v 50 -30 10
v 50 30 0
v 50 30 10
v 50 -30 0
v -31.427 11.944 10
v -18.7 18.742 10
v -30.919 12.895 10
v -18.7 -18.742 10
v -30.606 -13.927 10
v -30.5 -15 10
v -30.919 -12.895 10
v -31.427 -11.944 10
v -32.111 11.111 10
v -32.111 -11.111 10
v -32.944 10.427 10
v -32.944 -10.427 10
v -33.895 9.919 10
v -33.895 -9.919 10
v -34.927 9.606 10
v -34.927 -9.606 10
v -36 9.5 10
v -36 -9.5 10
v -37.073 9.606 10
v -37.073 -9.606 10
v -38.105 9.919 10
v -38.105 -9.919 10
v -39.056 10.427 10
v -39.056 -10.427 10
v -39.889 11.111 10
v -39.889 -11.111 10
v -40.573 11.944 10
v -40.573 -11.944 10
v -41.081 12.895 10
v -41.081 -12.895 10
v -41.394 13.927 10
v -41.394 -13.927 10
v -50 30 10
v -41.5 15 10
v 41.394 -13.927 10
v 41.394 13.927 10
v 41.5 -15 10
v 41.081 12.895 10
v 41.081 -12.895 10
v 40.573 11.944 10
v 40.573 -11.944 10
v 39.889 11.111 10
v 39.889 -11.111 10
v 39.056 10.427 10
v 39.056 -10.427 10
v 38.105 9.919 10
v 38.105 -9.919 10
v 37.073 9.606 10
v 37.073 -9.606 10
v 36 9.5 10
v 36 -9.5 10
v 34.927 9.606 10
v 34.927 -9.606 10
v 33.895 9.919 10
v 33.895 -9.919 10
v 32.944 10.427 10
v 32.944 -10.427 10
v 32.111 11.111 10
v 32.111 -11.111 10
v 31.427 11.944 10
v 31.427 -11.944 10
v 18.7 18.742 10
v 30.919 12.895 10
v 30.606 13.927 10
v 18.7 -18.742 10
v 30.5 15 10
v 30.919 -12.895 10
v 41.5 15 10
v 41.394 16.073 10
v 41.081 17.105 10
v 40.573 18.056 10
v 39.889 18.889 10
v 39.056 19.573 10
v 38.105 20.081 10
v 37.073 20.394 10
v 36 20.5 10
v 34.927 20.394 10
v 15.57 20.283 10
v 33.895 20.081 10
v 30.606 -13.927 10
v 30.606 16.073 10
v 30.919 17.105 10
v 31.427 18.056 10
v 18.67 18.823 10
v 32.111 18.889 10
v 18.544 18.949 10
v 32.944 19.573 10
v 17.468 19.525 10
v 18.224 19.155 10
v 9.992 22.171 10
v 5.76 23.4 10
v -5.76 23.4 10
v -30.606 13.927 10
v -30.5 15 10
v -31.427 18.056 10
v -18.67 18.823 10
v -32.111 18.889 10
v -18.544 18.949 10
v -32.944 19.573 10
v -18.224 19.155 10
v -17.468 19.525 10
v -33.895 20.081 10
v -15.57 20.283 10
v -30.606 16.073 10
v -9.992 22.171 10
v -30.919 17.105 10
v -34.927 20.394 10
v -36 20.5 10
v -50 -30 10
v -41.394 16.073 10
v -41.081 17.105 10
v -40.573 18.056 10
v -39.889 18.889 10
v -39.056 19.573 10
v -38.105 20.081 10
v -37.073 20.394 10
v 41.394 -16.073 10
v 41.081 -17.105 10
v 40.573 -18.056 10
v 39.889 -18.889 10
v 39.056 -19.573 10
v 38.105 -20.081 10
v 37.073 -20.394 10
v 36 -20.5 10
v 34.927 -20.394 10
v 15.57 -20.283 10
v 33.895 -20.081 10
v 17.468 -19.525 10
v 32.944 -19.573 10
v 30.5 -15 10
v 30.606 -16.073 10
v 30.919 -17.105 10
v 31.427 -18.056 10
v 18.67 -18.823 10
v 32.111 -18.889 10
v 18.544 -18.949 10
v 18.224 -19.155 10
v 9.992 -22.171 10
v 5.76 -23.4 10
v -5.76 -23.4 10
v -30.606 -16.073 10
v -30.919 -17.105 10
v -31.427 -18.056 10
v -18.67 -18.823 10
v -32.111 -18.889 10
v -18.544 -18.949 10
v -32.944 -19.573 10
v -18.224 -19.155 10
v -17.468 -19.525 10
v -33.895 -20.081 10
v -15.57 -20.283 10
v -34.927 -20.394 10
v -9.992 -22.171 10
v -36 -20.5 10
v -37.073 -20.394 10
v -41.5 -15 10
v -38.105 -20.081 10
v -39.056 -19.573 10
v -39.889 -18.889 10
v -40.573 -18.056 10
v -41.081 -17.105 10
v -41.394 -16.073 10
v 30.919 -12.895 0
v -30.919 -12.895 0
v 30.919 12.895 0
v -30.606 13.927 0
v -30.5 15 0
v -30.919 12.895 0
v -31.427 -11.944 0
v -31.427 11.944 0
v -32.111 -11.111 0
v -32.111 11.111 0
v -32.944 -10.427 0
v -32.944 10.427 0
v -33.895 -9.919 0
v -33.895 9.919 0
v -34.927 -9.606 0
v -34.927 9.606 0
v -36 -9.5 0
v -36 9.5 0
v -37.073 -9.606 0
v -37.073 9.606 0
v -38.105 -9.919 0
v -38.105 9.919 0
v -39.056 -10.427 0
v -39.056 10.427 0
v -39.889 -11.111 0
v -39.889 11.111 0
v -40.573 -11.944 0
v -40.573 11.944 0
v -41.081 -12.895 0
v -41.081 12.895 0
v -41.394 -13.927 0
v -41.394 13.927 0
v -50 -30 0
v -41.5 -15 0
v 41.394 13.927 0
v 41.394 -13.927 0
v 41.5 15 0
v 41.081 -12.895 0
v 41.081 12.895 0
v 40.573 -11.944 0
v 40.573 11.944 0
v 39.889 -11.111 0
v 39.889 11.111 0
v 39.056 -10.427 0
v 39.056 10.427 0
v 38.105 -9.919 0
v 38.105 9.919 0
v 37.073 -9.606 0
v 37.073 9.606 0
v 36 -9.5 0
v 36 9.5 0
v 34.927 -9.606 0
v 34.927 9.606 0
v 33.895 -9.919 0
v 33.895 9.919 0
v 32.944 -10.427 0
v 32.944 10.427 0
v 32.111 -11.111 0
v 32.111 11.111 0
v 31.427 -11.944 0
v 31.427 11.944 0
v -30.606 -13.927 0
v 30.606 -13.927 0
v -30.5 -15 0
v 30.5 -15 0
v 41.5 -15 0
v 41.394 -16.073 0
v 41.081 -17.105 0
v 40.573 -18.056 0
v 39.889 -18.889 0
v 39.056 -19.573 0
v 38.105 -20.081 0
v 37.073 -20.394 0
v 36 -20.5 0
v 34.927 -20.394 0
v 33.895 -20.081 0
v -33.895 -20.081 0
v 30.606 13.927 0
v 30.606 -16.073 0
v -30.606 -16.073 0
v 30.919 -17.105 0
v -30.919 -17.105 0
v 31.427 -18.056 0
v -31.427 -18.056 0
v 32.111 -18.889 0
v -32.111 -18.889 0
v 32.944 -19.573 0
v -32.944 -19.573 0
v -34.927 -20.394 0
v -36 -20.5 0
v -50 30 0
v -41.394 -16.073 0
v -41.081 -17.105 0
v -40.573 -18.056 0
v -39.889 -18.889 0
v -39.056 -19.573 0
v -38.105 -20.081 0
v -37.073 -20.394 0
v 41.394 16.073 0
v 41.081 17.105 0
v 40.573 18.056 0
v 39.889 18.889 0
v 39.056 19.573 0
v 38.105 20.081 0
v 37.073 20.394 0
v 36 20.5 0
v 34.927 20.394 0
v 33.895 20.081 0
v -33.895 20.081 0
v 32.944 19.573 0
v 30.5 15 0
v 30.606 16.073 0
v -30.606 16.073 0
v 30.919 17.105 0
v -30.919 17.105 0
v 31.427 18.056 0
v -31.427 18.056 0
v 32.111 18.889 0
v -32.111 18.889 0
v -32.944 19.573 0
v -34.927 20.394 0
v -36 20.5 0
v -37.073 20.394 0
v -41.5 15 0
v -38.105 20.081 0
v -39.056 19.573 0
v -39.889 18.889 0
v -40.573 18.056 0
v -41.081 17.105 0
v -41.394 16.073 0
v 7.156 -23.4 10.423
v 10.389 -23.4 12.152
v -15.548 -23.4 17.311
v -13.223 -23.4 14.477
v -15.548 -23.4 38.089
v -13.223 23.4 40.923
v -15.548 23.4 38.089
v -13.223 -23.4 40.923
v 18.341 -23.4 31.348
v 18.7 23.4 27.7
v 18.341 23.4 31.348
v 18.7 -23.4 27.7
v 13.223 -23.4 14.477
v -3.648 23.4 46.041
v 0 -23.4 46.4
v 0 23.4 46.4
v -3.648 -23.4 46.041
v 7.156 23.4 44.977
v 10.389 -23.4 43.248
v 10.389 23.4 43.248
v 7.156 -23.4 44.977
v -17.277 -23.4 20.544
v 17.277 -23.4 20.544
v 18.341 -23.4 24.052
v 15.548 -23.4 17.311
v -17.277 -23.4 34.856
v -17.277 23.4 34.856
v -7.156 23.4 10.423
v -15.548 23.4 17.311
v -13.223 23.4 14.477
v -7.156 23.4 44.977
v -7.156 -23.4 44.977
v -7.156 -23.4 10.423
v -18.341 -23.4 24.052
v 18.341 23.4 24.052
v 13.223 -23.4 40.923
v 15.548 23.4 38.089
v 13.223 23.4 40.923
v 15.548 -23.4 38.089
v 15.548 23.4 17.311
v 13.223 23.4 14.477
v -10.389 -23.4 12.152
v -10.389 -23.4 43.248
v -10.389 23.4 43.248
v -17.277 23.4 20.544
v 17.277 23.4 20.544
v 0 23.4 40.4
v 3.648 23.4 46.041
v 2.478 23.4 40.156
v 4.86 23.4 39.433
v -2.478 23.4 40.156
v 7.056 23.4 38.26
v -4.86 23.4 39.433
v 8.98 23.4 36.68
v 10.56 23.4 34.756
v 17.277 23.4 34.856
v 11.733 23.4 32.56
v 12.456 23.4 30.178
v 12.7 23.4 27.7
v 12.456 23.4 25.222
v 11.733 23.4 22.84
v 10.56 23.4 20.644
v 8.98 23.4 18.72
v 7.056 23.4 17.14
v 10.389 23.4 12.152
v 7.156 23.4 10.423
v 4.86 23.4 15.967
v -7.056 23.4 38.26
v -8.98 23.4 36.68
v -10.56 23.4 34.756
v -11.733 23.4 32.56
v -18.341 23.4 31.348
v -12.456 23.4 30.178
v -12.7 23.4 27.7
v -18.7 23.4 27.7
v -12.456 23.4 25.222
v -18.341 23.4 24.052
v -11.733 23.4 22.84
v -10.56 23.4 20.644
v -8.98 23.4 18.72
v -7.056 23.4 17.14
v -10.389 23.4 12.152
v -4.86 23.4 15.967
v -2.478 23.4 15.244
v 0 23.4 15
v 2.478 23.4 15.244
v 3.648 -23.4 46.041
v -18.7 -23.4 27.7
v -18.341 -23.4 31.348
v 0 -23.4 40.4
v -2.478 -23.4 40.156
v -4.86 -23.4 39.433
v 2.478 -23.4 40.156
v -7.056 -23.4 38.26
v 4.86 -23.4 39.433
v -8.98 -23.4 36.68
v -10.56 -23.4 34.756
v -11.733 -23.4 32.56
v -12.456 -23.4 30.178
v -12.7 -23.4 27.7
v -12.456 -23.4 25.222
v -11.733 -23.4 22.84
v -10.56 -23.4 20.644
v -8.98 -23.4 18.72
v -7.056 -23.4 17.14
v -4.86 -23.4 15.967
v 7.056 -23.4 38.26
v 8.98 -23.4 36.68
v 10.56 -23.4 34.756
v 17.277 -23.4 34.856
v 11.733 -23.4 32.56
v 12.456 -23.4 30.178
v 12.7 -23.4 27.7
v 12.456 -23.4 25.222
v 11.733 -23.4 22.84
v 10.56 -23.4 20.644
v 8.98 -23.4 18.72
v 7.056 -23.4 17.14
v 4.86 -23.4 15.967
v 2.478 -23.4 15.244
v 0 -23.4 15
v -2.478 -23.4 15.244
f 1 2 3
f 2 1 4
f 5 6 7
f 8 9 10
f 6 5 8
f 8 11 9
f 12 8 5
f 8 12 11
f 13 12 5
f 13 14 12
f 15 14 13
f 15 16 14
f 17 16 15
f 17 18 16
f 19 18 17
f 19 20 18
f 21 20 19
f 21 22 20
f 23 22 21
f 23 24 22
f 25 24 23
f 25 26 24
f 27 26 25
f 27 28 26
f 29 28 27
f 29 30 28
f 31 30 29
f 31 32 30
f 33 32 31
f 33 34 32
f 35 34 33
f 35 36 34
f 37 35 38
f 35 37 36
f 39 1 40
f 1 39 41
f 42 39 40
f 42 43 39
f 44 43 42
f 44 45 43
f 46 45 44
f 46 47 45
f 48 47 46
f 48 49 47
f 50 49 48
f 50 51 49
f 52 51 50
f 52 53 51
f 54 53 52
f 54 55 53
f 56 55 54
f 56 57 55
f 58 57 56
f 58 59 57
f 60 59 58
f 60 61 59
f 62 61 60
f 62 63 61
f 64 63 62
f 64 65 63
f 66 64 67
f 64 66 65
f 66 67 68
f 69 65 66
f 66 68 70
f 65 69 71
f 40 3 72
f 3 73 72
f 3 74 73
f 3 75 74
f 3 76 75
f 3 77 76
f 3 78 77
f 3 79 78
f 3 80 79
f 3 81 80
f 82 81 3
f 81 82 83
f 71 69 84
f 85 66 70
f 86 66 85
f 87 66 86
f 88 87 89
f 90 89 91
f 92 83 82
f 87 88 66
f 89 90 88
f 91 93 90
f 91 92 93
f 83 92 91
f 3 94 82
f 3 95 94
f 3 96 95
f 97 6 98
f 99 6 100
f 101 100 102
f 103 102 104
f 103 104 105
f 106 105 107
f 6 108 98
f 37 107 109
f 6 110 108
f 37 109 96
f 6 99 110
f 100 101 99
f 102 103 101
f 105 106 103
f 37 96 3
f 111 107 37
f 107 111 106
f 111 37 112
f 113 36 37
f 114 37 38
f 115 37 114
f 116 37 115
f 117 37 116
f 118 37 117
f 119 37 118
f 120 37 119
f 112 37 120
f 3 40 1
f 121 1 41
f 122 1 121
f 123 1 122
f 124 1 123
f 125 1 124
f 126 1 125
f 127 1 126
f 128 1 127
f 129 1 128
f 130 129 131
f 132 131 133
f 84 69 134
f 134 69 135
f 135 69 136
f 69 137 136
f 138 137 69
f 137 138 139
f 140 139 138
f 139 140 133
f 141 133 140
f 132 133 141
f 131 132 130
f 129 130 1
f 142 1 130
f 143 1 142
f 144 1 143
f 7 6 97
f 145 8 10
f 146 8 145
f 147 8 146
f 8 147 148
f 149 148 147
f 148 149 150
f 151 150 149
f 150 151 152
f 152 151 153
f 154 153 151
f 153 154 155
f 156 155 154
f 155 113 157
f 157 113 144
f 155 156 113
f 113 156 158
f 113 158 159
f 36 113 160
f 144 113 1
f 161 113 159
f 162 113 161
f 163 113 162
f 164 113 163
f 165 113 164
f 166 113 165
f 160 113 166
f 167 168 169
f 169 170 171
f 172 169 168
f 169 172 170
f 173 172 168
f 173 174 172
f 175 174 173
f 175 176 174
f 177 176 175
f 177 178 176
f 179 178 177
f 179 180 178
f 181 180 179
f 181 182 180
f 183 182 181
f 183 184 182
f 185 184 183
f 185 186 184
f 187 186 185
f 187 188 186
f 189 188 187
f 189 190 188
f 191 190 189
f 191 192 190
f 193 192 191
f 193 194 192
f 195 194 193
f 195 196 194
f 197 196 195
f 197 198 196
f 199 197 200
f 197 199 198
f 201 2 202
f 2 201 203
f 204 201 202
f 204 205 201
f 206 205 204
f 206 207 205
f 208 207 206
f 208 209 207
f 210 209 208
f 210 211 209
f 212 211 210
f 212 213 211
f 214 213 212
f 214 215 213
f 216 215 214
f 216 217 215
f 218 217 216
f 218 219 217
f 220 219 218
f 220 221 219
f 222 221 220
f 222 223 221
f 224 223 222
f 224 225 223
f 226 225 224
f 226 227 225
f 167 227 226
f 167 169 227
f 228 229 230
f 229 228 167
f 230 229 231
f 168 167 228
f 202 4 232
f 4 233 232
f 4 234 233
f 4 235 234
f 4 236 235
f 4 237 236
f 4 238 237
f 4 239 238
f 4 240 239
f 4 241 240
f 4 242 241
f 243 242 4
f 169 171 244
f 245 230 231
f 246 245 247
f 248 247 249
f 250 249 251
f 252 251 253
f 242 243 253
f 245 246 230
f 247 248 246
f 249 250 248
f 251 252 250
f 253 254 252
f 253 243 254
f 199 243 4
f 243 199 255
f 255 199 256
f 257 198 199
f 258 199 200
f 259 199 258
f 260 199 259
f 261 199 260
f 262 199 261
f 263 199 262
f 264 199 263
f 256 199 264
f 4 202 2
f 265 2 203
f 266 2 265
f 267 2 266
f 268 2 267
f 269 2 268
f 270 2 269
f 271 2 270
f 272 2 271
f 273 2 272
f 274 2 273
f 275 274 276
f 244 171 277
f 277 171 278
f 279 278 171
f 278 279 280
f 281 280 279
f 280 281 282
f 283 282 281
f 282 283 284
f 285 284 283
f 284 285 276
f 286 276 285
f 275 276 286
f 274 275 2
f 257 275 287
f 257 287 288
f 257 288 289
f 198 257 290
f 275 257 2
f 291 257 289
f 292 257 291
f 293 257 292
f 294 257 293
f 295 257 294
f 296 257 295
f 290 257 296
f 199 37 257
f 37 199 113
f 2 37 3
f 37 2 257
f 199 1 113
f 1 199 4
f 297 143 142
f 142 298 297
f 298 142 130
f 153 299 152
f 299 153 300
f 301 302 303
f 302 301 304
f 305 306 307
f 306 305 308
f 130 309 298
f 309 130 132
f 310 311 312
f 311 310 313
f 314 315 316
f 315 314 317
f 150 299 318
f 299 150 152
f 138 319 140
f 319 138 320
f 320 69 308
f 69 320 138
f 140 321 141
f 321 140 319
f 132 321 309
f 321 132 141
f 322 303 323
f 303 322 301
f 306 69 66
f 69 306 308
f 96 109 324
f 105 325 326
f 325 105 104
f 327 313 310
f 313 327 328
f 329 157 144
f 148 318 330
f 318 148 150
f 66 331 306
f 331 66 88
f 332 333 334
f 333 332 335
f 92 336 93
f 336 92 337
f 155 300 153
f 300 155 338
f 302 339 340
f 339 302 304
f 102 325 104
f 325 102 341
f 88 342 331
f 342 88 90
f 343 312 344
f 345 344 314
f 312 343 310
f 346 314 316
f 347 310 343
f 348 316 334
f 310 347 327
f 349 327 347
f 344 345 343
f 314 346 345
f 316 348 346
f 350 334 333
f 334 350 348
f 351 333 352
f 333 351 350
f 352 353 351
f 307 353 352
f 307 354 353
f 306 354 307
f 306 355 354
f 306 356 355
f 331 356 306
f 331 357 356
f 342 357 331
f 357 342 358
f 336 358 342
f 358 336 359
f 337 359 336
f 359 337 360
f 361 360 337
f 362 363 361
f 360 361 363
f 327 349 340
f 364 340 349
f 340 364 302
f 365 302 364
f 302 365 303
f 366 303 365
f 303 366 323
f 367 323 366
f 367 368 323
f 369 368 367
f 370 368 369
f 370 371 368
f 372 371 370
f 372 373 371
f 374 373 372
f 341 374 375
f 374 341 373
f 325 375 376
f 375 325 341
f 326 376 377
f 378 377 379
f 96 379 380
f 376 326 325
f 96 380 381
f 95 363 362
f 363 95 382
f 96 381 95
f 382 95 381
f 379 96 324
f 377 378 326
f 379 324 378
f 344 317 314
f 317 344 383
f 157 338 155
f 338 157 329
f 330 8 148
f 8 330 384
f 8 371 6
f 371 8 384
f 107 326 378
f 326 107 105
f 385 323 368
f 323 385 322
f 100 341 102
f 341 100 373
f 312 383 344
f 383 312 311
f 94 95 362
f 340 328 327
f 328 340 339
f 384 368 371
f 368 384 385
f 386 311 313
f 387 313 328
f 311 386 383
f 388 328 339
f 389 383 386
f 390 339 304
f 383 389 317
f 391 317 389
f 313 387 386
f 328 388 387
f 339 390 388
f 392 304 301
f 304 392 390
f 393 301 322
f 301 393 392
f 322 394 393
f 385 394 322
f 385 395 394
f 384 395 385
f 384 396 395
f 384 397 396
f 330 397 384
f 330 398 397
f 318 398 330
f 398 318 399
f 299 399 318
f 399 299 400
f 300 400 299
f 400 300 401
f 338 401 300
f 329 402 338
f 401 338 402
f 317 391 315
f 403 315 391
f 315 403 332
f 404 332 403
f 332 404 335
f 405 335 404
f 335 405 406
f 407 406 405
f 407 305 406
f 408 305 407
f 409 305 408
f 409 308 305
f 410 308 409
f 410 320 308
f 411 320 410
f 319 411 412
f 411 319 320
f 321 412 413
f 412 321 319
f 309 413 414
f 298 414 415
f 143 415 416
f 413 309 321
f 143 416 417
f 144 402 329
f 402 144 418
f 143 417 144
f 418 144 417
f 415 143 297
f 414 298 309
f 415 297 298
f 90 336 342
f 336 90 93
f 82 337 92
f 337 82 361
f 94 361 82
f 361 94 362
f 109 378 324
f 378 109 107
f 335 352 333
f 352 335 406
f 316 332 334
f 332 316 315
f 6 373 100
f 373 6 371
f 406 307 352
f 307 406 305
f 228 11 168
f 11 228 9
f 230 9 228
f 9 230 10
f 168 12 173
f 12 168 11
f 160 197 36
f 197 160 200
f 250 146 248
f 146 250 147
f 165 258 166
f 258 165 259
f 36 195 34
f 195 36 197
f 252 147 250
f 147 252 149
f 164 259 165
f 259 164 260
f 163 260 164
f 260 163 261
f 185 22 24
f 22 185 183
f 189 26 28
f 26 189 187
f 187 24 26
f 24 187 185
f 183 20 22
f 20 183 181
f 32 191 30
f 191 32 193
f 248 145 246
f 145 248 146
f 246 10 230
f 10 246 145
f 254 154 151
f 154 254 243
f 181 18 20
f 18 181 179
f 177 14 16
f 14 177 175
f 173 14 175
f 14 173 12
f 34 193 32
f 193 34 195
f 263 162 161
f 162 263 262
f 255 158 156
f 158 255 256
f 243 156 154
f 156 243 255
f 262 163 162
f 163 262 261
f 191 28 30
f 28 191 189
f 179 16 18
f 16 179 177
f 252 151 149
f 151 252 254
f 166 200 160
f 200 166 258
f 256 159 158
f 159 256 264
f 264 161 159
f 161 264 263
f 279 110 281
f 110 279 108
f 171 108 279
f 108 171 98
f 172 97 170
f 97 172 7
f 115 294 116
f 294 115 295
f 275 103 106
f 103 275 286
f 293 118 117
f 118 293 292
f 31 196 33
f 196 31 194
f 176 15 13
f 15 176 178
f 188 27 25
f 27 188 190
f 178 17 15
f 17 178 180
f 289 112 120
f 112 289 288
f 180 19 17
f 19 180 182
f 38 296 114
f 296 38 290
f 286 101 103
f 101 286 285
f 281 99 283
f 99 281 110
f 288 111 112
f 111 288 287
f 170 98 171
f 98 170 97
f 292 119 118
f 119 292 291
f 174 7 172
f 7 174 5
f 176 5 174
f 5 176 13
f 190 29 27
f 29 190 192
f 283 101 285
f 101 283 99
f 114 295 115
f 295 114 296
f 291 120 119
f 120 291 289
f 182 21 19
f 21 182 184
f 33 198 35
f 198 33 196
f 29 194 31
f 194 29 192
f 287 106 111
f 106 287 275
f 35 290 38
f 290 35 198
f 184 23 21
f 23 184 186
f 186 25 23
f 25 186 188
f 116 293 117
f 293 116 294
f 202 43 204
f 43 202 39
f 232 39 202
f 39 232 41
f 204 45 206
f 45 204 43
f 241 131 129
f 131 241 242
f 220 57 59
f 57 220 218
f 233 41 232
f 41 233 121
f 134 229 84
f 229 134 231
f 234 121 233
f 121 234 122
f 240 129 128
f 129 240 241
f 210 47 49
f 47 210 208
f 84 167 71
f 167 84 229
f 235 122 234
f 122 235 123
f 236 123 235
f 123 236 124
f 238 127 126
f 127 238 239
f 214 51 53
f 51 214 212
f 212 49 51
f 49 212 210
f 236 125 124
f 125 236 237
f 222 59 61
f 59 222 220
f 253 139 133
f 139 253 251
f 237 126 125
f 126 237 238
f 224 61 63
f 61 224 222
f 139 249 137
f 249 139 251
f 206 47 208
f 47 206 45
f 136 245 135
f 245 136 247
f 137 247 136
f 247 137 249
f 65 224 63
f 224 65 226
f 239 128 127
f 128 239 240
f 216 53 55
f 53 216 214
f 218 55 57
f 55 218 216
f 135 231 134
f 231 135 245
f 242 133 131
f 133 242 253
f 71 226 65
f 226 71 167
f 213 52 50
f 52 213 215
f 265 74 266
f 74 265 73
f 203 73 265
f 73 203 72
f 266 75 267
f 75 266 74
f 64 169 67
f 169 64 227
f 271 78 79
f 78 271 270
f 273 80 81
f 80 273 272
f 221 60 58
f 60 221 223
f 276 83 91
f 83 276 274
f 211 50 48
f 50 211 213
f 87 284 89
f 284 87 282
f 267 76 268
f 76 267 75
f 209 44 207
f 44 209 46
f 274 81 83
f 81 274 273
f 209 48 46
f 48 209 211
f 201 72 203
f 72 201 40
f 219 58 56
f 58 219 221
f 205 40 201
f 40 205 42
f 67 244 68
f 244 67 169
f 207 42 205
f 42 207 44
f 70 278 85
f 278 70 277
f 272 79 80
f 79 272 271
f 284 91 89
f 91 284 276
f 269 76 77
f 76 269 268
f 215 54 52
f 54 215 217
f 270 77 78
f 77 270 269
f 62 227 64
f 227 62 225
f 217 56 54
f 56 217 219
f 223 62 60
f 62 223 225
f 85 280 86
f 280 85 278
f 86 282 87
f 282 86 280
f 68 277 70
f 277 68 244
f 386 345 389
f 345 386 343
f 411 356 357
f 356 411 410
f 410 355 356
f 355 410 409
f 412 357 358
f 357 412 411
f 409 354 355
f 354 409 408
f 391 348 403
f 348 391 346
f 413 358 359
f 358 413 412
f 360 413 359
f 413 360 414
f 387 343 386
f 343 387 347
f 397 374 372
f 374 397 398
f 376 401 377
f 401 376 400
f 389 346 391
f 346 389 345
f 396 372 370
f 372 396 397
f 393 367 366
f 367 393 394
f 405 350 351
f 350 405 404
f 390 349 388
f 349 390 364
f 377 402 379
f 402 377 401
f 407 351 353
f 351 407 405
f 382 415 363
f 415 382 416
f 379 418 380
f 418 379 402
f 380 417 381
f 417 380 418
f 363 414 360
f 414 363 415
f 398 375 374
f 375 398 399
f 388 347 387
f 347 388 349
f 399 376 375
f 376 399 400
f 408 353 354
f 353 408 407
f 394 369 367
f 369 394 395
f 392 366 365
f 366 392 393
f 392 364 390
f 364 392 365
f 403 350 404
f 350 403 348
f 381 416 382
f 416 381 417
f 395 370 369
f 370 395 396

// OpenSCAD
$fn = 32;

// ----------------------------------------------------------------------
// Bearing block: 100 x 60 mm base, 25.4 mm bore at 27.7 mm
// ----------------------------------------------------------------------

// --- parameters (mm) ---
base_w = 100;             // base width
base_d = 60;              // base depth
base_t = 10;              // base thickness
bore_d = 25.4;            // shaft / bearing bore
house_r = 18.7;           // housing outer radius
house_len = 46.8;         // housing length along the shaft
foot_w = 37.4;            // foot width under the housing
foot_len = 36.8;          // foot length along the shaft
axis_z = 27.7;            // bore axis height above the base
holes_d = 11;             // mounting holes
hole_x = 36;              // mounting hole spacing

difference() {
  union() {
    /* base plate with its underside on z = 0 */
    translate([0, 0, base_t / 2]) cube([base_w, base_d, base_t], center = true);
    /* hull foot: a straight web blending into the round housing */
    hull() {
      translate([0, 0, base_t - 0.5]) cube([foot_w, foot_len, 1.6], center = true);
      translate([0, 0, axis_z]) rotate([-90, 0, 0]) cylinder(h = house_len, d = 2 * house_r, center = true);
    }
  }
  /* bore through the housing, 2.5 mm clear on both sides */
  translate([0, 0, axis_z]) rotate([-90, 0, 0]) cylinder(h = house_len + 5, d = bore_d, center = true);
  /* mounting holes through the base plate */
  for (hx = [-36, 36]) {
    for (hy = [-15, 15]) {
      translate([hx, hy, -2.5]) cylinder(h = base_t + 5, d = holes_d);
    }
  }
}
